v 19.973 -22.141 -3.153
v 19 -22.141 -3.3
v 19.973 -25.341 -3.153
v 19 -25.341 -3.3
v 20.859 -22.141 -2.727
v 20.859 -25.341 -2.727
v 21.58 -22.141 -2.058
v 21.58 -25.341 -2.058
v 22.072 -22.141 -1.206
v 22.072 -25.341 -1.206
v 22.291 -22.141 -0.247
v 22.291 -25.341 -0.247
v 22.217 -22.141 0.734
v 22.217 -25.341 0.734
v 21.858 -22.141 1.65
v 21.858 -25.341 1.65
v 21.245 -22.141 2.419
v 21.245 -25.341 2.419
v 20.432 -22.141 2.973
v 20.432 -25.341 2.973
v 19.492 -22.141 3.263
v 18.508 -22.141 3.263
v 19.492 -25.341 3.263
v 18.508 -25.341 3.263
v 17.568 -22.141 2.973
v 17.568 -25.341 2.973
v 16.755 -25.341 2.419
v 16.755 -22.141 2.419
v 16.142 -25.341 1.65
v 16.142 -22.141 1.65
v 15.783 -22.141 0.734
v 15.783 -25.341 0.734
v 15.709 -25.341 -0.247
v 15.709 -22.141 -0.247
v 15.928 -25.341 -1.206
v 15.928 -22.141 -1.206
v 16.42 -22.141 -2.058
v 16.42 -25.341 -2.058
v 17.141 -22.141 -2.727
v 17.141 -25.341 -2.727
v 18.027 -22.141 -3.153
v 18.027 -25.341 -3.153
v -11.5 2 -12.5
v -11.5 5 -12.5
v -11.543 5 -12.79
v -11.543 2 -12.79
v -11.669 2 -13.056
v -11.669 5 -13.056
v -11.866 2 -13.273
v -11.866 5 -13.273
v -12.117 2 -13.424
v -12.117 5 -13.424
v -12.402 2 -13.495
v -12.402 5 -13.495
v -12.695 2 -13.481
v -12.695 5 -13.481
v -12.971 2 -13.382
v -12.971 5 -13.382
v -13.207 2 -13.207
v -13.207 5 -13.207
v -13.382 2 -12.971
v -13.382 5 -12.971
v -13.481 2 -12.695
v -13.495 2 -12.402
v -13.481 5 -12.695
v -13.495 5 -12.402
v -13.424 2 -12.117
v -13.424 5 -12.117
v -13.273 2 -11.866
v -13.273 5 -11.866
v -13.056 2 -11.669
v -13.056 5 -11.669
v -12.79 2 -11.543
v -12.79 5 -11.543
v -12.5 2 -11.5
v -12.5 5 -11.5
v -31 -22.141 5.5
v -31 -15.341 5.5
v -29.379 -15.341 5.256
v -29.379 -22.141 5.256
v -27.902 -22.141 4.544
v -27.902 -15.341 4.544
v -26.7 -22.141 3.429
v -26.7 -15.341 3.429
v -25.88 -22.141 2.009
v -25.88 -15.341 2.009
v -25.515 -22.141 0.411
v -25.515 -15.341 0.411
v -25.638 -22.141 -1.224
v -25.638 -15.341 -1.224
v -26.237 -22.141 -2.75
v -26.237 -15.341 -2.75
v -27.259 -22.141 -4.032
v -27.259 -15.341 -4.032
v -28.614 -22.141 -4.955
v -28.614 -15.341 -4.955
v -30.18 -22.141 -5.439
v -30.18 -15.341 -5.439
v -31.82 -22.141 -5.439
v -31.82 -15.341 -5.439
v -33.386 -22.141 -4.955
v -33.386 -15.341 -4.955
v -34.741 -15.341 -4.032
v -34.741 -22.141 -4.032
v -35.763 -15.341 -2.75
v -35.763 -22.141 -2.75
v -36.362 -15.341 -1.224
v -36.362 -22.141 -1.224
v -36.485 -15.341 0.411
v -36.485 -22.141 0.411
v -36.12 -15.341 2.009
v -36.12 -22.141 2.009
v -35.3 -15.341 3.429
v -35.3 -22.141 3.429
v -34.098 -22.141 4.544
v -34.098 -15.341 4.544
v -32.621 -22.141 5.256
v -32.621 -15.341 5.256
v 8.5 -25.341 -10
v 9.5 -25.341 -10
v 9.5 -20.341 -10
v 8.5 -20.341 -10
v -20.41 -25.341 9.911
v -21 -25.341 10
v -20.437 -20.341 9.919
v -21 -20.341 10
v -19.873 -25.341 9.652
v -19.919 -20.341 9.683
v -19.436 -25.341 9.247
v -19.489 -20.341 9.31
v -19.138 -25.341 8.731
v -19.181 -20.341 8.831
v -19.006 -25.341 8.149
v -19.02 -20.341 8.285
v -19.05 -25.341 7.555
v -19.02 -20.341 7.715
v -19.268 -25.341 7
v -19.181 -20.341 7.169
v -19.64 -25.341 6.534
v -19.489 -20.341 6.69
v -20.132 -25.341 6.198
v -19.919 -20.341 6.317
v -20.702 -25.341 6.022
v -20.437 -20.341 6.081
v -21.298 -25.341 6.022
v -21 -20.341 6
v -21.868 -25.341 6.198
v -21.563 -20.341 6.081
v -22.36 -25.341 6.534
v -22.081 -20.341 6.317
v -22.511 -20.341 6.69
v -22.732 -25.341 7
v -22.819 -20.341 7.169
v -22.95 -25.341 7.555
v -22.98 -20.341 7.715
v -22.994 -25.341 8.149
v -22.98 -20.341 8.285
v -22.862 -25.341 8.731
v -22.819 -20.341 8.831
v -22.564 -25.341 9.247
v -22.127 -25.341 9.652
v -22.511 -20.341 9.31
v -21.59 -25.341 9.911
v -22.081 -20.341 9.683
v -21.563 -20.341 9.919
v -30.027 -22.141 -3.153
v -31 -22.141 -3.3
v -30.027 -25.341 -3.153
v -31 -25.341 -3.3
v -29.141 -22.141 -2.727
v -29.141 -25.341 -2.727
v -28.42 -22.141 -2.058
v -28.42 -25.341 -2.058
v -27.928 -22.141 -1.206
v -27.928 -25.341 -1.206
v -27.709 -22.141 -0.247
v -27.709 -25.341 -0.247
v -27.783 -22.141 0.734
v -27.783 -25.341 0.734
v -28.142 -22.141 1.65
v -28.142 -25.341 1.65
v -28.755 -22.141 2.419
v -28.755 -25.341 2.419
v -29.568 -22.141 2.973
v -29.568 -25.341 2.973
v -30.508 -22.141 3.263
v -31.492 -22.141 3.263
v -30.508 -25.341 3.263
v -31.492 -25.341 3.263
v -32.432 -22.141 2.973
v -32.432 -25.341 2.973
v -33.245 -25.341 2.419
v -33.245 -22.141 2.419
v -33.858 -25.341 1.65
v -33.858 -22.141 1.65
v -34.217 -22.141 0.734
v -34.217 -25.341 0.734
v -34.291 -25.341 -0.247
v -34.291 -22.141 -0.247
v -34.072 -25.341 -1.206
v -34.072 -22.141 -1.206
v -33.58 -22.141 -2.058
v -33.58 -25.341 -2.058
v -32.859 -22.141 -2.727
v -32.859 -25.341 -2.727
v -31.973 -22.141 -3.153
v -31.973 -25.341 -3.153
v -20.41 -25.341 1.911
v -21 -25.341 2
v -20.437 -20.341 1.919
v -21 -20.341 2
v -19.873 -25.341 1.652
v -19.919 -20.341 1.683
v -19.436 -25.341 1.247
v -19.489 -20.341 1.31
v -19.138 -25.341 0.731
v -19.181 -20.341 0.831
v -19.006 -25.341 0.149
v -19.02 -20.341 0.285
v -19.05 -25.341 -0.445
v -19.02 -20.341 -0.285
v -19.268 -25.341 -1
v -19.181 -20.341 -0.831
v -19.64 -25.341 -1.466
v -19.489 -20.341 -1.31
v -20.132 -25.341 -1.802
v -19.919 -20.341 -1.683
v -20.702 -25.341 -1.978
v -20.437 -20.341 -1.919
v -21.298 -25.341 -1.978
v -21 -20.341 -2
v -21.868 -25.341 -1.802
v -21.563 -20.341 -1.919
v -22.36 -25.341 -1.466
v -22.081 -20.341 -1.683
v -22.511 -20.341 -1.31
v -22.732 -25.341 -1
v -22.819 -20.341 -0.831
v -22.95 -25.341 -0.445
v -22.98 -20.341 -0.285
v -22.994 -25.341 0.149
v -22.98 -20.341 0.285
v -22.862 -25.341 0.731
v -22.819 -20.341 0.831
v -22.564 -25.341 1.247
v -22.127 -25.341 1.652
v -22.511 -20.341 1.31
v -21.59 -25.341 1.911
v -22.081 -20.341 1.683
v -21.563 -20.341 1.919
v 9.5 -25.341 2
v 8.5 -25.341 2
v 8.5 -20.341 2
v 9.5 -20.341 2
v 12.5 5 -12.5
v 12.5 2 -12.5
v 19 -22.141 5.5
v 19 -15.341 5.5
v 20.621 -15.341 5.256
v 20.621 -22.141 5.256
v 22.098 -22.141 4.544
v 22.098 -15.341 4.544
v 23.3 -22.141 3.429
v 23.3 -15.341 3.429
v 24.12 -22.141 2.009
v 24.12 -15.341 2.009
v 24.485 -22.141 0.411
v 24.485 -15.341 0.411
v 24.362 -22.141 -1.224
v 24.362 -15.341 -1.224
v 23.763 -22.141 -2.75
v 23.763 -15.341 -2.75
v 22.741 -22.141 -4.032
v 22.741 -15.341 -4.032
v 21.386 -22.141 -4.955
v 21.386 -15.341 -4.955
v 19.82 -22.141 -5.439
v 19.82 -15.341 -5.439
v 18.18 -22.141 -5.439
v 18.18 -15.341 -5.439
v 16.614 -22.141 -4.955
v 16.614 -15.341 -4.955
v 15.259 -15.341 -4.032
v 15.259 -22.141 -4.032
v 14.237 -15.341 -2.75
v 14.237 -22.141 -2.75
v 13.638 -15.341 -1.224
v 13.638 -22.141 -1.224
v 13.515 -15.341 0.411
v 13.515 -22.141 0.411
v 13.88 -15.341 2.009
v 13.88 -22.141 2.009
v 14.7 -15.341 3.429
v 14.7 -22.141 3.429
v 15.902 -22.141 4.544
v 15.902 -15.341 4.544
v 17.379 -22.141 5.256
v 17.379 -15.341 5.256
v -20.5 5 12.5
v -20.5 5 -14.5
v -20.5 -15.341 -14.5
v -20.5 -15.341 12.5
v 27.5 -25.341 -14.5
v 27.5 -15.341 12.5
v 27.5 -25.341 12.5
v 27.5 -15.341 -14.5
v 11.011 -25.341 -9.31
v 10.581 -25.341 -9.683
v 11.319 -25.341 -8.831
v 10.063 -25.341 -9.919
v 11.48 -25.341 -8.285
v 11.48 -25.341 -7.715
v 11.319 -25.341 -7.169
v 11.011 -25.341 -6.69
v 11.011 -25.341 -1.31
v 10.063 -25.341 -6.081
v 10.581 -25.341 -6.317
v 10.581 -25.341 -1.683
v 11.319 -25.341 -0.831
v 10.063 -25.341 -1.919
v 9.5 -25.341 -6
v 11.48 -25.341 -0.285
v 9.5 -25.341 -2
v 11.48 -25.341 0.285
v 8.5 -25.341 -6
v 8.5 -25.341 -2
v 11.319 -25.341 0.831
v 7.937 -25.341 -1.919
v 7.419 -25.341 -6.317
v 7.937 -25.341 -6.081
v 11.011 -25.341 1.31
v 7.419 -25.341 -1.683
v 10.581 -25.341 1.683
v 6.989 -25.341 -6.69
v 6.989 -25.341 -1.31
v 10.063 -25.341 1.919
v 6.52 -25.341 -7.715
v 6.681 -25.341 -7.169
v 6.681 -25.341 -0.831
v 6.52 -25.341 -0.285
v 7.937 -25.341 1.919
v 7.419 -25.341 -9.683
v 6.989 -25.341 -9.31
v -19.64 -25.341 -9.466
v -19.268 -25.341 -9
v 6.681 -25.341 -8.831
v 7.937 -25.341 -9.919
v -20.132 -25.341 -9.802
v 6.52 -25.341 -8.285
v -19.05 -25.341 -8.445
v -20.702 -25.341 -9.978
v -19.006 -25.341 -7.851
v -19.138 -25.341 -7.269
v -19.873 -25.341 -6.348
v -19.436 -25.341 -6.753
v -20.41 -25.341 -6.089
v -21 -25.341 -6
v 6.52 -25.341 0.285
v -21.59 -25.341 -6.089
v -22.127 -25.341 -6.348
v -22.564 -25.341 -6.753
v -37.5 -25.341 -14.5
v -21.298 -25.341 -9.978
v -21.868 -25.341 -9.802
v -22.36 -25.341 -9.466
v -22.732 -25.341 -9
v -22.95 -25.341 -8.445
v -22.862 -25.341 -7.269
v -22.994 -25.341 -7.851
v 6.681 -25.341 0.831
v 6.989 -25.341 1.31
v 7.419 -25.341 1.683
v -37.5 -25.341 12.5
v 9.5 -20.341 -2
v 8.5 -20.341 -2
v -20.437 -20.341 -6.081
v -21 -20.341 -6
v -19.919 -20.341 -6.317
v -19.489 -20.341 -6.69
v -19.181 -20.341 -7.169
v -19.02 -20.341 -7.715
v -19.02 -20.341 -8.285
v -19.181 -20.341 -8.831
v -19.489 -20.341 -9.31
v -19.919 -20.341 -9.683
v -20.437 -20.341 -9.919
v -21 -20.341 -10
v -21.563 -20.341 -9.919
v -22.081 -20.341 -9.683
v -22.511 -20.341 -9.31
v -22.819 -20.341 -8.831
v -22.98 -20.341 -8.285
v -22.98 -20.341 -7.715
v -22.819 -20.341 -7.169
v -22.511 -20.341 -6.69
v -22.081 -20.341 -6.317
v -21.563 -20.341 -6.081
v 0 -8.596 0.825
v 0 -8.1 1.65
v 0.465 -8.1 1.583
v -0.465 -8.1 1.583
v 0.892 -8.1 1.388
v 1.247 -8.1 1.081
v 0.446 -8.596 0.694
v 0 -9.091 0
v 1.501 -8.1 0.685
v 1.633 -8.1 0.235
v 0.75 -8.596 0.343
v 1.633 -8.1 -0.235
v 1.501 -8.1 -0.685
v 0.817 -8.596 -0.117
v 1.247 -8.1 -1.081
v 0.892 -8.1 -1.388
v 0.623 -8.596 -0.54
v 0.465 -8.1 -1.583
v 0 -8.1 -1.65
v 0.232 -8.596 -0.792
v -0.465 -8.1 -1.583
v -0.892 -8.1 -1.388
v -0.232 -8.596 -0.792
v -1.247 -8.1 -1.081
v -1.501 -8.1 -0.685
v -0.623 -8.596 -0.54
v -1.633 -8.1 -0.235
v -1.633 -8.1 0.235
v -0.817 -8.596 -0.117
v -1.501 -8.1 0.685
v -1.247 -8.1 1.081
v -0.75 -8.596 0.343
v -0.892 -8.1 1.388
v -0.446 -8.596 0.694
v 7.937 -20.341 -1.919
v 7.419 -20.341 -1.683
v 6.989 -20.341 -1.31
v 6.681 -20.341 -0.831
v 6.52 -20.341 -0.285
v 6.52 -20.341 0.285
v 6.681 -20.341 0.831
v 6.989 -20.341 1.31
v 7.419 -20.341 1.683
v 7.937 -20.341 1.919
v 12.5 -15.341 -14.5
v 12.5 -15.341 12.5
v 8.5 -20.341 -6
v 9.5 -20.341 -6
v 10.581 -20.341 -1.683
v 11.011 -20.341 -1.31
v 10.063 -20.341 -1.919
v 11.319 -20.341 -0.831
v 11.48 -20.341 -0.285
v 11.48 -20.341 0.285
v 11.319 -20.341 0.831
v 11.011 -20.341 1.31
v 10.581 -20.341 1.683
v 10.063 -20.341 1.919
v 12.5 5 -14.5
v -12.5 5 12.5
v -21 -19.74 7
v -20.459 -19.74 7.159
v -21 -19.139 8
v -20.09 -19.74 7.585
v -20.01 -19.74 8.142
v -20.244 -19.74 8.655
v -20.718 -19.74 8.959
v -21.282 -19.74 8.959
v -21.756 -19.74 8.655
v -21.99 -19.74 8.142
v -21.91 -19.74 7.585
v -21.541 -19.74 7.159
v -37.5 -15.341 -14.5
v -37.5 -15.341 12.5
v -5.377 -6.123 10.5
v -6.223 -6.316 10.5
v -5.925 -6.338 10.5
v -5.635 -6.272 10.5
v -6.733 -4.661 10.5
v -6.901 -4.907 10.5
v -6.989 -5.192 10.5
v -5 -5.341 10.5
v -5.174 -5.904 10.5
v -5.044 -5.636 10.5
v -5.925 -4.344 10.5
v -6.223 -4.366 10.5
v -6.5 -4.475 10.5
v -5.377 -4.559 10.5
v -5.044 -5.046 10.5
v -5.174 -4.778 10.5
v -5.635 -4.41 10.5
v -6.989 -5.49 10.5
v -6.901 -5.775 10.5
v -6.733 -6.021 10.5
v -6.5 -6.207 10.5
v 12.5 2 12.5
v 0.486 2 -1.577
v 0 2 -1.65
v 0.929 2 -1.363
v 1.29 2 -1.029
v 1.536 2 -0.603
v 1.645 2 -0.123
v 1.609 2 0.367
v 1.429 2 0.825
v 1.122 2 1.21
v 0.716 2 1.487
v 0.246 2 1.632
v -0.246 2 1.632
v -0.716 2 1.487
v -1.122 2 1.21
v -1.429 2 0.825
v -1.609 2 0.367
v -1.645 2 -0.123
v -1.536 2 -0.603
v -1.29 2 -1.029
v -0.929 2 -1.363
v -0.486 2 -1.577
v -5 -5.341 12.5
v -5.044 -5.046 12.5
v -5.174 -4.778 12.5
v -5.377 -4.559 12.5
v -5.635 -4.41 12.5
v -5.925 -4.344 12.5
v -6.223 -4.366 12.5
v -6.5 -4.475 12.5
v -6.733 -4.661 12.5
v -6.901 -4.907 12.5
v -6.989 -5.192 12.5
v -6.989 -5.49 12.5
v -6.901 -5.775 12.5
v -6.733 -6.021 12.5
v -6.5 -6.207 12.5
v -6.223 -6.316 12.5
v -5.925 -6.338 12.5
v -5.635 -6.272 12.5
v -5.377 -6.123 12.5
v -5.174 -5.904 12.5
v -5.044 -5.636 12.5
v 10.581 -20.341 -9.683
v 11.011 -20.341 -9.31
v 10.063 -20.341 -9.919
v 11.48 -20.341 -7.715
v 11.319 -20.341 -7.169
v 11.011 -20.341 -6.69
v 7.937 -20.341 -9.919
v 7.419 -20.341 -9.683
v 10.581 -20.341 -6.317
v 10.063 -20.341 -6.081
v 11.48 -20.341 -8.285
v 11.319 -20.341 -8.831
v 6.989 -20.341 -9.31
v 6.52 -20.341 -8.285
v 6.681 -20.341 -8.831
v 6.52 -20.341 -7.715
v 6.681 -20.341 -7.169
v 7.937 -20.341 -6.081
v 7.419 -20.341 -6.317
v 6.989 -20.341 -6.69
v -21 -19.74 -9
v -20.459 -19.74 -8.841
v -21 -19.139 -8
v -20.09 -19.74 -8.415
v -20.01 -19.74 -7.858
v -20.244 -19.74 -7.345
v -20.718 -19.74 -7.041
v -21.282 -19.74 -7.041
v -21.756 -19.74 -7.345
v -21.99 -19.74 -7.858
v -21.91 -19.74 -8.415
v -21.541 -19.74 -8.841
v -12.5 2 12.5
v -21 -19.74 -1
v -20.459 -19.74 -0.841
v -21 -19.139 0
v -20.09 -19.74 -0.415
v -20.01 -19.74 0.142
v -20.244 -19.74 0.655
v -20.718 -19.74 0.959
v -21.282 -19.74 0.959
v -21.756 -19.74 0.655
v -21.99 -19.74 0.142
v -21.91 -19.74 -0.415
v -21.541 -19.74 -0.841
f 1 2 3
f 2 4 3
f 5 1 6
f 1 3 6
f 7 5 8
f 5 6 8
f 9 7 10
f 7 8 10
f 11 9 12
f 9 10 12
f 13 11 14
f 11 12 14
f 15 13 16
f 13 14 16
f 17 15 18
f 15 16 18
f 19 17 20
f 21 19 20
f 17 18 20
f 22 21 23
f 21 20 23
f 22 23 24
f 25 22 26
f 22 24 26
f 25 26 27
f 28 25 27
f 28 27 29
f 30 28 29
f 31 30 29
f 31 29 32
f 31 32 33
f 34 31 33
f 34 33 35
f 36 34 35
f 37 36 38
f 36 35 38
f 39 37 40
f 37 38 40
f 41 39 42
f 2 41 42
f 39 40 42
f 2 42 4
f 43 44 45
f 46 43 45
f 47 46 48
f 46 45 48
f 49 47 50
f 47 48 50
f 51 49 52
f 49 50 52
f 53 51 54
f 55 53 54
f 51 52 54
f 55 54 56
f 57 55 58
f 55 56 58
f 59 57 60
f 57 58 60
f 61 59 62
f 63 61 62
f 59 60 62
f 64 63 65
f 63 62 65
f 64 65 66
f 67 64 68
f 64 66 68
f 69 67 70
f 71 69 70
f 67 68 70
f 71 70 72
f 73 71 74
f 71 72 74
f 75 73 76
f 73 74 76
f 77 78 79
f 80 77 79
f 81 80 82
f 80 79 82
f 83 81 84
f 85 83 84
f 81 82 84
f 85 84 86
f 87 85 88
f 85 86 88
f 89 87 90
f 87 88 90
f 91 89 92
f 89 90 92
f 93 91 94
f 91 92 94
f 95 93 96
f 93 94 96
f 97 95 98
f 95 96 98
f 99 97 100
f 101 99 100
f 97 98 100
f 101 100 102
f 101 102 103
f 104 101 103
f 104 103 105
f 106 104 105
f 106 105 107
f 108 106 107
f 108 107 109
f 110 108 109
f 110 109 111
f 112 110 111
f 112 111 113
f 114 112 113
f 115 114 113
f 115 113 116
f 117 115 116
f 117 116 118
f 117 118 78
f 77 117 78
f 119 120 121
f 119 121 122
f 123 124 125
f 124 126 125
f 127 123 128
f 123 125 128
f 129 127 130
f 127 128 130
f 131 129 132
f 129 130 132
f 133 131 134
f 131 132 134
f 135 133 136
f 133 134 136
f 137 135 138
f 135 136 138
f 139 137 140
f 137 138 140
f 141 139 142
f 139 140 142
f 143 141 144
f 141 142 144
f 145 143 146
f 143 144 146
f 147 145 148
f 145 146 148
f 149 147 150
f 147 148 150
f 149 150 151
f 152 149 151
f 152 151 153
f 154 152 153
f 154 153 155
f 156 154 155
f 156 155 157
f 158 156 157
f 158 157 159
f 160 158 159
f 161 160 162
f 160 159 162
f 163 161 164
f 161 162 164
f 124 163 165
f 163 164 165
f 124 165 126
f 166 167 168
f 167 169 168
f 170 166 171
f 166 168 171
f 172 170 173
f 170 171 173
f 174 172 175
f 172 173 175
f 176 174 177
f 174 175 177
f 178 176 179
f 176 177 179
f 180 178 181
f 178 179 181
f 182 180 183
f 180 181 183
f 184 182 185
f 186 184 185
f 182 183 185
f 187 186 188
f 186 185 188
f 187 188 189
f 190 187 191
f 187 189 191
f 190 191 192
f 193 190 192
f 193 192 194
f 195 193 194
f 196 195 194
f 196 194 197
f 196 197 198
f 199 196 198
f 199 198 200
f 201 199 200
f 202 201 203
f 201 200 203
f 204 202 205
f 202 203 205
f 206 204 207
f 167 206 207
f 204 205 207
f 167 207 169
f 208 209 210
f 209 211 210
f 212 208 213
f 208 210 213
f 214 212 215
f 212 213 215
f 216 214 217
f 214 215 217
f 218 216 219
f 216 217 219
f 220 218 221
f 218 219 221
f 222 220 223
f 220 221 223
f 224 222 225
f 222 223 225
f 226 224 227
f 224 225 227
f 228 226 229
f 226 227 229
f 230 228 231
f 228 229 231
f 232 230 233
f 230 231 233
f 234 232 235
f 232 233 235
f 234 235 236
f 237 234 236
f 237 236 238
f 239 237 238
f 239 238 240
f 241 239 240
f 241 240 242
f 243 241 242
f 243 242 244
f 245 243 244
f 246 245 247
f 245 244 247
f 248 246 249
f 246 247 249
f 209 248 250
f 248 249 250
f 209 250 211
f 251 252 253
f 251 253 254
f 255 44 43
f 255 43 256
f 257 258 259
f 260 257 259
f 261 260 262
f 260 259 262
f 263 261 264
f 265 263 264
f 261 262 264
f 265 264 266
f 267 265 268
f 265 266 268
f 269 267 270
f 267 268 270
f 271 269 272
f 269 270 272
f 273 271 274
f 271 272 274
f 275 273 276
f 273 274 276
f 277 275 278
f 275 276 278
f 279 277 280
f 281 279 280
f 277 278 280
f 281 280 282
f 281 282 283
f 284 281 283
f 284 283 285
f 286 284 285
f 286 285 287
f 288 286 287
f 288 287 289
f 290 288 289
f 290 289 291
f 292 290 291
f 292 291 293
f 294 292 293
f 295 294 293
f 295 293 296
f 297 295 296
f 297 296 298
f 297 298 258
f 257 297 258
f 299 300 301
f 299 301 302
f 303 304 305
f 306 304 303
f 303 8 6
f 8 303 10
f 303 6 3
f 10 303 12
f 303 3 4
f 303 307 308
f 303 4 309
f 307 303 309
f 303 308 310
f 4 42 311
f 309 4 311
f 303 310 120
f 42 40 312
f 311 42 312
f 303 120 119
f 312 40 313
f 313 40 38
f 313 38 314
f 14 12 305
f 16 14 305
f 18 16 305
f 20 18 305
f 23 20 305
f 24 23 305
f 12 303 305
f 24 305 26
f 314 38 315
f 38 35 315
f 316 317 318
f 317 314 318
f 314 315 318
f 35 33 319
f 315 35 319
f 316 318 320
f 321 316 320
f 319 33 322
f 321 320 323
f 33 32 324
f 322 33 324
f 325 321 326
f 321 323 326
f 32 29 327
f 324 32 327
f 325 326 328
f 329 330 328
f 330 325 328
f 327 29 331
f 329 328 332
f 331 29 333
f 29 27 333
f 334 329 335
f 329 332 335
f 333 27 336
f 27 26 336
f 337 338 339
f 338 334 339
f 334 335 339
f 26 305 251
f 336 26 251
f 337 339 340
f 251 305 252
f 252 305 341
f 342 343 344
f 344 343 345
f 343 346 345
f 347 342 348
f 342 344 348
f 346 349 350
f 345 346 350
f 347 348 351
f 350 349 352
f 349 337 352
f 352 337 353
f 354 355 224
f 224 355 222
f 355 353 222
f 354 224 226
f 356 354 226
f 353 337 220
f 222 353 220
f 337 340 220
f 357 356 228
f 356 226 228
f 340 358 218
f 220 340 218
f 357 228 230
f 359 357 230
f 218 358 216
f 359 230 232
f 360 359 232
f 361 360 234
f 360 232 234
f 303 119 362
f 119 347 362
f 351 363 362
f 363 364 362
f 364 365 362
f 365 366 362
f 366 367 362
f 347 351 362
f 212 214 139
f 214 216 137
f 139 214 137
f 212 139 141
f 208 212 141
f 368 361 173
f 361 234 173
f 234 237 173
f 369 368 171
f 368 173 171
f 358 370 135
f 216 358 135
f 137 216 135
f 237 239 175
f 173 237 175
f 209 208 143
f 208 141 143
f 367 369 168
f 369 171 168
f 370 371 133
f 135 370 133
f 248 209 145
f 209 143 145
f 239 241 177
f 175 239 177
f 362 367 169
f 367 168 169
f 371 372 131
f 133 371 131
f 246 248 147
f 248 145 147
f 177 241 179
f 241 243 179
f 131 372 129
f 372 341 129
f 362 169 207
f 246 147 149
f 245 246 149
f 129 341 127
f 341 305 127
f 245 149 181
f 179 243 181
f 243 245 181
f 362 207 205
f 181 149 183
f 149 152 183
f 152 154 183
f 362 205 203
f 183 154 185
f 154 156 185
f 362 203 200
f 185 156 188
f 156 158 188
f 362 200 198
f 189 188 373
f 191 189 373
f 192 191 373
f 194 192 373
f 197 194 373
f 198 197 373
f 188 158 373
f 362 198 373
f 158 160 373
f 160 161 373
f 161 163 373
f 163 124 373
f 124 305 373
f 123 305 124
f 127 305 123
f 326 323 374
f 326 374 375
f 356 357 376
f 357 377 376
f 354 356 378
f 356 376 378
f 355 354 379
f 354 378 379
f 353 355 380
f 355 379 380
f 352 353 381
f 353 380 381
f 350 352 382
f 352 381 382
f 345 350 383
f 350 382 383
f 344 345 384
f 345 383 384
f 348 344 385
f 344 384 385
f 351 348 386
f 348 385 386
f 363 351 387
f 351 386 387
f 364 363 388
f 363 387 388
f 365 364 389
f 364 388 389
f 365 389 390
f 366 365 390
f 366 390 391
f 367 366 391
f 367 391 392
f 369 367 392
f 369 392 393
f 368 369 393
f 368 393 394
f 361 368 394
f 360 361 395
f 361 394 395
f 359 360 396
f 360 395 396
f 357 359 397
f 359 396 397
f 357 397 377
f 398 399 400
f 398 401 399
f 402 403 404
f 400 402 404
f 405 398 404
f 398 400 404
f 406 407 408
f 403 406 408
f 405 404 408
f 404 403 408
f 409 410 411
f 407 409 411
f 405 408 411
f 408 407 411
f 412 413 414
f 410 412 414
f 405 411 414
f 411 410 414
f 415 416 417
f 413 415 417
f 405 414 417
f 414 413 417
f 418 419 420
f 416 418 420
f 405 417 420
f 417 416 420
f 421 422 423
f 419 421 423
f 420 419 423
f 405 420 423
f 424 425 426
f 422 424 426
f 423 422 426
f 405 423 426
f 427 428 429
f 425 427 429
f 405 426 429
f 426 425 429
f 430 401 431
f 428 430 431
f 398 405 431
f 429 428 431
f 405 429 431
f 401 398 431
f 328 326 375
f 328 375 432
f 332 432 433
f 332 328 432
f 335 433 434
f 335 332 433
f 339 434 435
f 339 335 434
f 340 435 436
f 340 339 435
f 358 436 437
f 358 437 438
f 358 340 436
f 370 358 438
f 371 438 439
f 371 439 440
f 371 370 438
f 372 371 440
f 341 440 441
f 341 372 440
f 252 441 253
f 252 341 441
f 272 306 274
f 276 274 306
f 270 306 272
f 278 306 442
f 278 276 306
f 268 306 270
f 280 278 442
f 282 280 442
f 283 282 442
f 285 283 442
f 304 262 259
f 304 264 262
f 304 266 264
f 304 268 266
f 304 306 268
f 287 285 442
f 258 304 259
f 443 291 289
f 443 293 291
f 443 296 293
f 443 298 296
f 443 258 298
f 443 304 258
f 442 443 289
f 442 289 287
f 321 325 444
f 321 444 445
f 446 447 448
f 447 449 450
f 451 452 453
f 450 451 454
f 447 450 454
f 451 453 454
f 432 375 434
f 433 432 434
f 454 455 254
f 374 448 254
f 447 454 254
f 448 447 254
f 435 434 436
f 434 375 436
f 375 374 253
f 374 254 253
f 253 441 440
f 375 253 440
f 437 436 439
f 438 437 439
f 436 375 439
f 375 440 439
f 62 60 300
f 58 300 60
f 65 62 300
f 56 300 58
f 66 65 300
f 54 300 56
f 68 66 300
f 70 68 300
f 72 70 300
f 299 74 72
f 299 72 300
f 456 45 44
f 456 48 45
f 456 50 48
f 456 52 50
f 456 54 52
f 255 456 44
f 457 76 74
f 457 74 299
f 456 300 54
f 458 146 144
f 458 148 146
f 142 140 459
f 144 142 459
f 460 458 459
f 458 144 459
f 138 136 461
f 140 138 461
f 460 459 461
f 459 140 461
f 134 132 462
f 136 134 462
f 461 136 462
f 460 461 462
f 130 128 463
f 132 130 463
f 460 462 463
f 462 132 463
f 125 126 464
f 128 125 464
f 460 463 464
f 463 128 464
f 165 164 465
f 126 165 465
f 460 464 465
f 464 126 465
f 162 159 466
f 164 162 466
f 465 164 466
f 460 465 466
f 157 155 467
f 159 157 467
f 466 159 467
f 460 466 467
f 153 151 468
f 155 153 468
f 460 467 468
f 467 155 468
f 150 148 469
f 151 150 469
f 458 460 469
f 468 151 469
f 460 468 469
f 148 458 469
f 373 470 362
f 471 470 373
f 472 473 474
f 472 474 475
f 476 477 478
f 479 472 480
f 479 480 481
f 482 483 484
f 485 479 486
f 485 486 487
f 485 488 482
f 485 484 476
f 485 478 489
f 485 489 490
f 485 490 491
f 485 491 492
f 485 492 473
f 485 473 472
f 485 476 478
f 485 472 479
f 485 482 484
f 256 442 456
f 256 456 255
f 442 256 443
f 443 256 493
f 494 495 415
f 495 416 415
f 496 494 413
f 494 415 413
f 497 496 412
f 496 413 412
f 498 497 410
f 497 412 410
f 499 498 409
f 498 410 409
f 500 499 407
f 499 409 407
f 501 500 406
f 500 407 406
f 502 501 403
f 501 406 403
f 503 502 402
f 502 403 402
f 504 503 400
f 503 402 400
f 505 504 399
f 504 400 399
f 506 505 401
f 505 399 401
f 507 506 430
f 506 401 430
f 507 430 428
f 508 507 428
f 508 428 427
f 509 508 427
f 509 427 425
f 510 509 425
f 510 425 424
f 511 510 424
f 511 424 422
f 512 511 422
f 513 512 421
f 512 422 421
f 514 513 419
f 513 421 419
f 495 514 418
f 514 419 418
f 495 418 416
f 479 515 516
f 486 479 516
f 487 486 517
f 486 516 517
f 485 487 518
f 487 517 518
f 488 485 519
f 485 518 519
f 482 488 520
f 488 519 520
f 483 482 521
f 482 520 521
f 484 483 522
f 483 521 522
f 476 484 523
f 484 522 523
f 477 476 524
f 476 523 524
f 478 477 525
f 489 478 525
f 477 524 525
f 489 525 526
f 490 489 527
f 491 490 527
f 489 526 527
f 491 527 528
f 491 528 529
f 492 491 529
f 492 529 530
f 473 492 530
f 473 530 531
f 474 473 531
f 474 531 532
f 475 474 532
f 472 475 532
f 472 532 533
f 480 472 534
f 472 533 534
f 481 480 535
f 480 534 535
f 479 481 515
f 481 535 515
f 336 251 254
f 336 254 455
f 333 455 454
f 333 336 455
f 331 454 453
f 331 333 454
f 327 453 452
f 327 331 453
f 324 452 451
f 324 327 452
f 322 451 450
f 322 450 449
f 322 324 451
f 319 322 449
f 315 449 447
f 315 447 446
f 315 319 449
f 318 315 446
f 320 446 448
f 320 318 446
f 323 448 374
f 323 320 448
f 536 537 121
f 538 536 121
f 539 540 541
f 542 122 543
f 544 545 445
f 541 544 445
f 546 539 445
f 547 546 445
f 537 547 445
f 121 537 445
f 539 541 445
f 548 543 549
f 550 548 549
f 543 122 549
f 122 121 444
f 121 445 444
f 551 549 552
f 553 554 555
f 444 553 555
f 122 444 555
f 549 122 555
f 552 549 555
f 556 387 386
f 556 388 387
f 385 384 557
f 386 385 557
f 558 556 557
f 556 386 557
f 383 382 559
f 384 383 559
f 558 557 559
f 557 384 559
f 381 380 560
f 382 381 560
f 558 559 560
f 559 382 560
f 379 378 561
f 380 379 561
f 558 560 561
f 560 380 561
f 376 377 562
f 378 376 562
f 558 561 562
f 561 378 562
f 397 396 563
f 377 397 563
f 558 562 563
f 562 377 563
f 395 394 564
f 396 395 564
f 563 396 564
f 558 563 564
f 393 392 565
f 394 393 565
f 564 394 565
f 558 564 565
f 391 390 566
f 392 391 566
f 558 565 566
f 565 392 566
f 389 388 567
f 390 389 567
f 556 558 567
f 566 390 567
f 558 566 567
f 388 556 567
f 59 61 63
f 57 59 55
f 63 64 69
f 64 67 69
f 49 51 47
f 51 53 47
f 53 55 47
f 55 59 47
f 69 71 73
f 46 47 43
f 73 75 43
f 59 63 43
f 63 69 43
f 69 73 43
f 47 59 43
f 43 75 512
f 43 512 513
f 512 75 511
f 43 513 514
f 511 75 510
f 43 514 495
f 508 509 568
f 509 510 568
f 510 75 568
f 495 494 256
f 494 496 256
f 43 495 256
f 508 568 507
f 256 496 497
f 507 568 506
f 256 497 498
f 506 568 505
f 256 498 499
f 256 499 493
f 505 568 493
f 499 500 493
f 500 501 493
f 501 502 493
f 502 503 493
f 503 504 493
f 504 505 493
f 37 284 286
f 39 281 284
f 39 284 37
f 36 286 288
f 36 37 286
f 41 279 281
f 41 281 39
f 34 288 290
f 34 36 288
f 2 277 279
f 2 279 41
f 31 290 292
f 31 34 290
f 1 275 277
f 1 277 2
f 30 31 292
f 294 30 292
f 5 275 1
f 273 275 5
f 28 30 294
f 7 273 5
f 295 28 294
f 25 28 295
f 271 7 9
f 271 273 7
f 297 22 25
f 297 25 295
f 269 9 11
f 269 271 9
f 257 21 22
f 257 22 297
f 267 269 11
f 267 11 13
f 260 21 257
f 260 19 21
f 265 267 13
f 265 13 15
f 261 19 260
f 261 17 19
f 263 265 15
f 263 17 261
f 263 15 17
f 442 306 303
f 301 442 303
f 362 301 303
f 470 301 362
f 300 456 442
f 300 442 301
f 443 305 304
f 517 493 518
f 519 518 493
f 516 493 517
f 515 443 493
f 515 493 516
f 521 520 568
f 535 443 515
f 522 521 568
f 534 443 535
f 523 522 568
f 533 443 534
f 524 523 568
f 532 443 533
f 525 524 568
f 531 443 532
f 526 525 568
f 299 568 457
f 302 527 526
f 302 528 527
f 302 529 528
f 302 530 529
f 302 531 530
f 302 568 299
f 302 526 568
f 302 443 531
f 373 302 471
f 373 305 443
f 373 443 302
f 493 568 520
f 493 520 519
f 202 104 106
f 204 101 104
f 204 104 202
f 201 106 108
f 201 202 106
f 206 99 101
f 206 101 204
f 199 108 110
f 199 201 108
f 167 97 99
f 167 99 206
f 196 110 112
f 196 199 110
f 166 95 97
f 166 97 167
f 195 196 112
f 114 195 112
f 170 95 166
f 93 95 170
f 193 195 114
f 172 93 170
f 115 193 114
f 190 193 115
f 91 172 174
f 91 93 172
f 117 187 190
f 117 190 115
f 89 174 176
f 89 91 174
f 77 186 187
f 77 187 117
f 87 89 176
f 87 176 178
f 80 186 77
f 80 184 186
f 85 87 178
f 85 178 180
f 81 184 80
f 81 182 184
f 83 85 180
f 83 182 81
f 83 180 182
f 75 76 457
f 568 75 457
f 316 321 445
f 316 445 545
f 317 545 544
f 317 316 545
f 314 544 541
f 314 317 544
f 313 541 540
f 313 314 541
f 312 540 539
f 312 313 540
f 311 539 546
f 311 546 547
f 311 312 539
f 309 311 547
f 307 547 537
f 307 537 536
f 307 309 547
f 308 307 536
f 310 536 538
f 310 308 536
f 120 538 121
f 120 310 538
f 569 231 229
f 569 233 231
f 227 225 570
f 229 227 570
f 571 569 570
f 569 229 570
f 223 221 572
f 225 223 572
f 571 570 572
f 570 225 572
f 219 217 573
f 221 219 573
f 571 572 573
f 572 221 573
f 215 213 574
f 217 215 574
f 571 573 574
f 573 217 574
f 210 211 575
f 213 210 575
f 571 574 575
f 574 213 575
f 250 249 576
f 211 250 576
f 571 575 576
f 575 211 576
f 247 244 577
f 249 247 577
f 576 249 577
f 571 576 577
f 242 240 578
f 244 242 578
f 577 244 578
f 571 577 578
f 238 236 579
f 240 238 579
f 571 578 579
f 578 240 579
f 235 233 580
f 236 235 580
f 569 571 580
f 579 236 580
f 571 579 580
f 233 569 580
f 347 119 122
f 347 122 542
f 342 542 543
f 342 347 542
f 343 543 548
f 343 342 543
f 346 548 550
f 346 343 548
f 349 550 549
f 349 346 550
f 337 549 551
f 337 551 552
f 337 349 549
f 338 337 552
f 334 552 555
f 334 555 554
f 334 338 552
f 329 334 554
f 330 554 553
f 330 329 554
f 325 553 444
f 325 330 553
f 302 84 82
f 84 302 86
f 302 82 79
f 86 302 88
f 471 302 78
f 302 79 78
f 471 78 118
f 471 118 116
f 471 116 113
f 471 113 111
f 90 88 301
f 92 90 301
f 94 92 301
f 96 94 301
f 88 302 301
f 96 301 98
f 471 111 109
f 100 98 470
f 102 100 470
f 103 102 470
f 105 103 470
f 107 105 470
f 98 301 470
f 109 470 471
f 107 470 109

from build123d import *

# Parameters (mm, degrees)
SKETCH_1_W                = 29
SKETCH_1_H                = 29
EXTRUDE_1_DEPTH           = 5
SKETCH_2_W                = 25
SKETCH_2_H                = 25
CUT_EXTRUDE_1_DEPTH       = 3
SKETCH_3_W                = 35
SKETCH_3_H                = 29
EXTRUDE_747_DEPTH         = 25.341167732
HOLE_WIZARD_M4_1_D        = 3.3
HOLE_WIZARD_M4_1_DEPTH    = 10.1
HOLE_WIZARD_M4_1_TIP      = 0.991420021
SKETCH_9_R                = 1
CUT_EXTRUDE_2_DEPTH       = 3
SKETCH_11_W               = 29
SKETCH_11_H               = 5
EXTRUDE_4_DEPTH           = 6
CUT_EXTRUDE_8_DEPTH       = 40.383835
SKETCH_19_W               = 80
SKETCH_19_H               = 25
EXTRUDE_5_DEPTH           = 10
HOLE_WIZARD_1_D           = 6.6
HOLE_WIZARD_1_DEPTH       = 10.1
HOLE_WIZARD_1_CBORE_D     = 11
HOLE_WIZARD_1_CBORE_DEPTH = 6.8
HOLE_WIZARD_1_TIP         = 1.982840043
SKETCH_23_W               = 80
SKETCH_23_H               = 10
EXTRUDE_6_DEPTH           = 2
SKETCH_24_W               = 27
SKETCH_24_H               = 10
CUT_EXTRUDE_9_DEPTH       = 2
MM_1_D                    = 4
MM_1_DEPTH                = 5
MM_1_TIP                  = 1.201721238
CUT_EXTRUDE_10_DEPTH      = 5
SKETCH_28_R               = 1
CUT_EXTRUDE_11_DEPTH      = 2
HOLE_WIZARD_M6_1_D        = 5
HOLE_WIZARD_M6_1_DEPTH    = 10
HOLE_WIZARD_M6_1_TIP      = 1.502151548
CUT_EXTRUDE_12_DEPTH      = 62.837260656
CUT_EXTRUDE_12_DEPTH_BACK = 62.837260656
SKETCH_32_W               = 27
SKETCH_32_H               = 10
CUT_EXTRUDE_13_DEPTH      = 6.5
SKETCH_33_W               = 27
SKETCH_33_H               = 10
CUT_EXTRUDE_14_DEPTH      = 6.5
CUT_EXTRUDE_15_DEPTH      = 5
MM_2_D                    = 4
MM_2_DEPTH                = 5
MM_2_TIP                  = 1.201721238
MM_3_D                    = 4
MM_3_DEPTH                = 5
MM_3_TIP                  = 1.201721238
SKETCH_38_W               = 23.961905905
SKETCH_38_H               = 13.839319444
EXTRUDE_7_DEPTH           = 27


with BuildPart() as part:
    # 草图1 → 凸台-拉伸1 (new body)
    with BuildSketch(Plane(origin=(0, 0, 0), x_dir=(1, 0, 0), z_dir=(0, 1, 0))):
        Rectangle(SKETCH_1_W, SKETCH_1_H)
    extrude(amount=EXTRUDE_1_DEPTH)

    # 草图2 → 切除-拉伸1 (cut)
    with BuildSketch(Plane.XZ.offset(-5)):
        Rectangle(SKETCH_2_W, SKETCH_2_H)
    extrude(amount=CUT_EXTRUDE_1_DEPTH, mode=Mode.SUBTRACT)

    # 草图3 → Extrude 747 (add)
    with BuildSketch(Plane(origin=(0, 0, 0), x_dir=(-1, 0, 0), z_dir=(0, -1, 0))):
        with Locations((3, 0)):
            Rectangle(SKETCH_3_W, SKETCH_3_H)
    extrude(amount=EXTRUDE_747_DEPTH)

    # M4 螺纹孔1
    with Locations(Plane.ZX.offset(2)):
        with Locations((0, 0)):
            Hole(HOLE_WIZARD_M4_1_D / 2, depth=HOLE_WIZARD_M4_1_DEPTH)
            with Locations((0, 0, -(HOLE_WIZARD_M4_1_DEPTH + HOLE_WIZARD_M4_1_TIP / 2))):  # 118° drill point
                Cone(0, HOLE_WIZARD_M4_1_D / 2, HOLE_WIZARD_M4_1_TIP, mode=Mode.SUBTRACT)

    # 草图9 → 切除-拉伸2 (cut)
    with BuildSketch(Plane(origin=(0, 5, 0), x_dir=(1, 0, 0), z_dir=(0, 1, 0))):
        with Locations((-12.5, 12.5)):
            Circle(SKETCH_9_R)
    extrude(amount=-CUT_EXTRUDE_2_DEPTH, mode=Mode.SUBTRACT)

    # 草图11 → 凸台-拉伸4 (add)
    with BuildSketch(Plane.ZY.offset(14.5)):
        with Locations((0, 2.5)):
            Rectangle(SKETCH_11_W, SKETCH_11_H)
    extrude(amount=EXTRUDE_4_DEPTH)

    # 草图17 → 切除-拉伸8 (cut, through all)
    with BuildSketch(Plane(origin=(0, 5, 0), x_dir=(1, 0, 0), z_dir=(0, 1, 0))):
        Polygon((-20.5, -14.5), (14.5, -14.5), (14.5, 14.5), (12.5, 14.5), (12.5, -12.5), (-20.5, -12.5), align=None)
    extrude(amount=-CUT_EXTRUDE_8_DEPTH, mode=Mode.SUBTRACT)

    # 草图19 → 凸台-拉伸5 (add)
    with BuildSketch(Plane(origin=(0, -25.341167732, 0), x_dir=(-1, 0, 0), z_dir=(0, -1, 0))):
        with Locations((6, 0)):
            Rectangle(SKETCH_19_W, SKETCH_19_H)
    extrude(amount=-EXTRUDE_5_DEPTH)

    # 打孔尺寸(%根据)内六角圆柱头螺钉的类型1
    with Locations(Plane(origin=(-31, -15.341167732, 0), x_dir=(0, 0, 1), z_dir=(0, 1, 0))):
        with Locations((0, 0), (0, 50)):
            CounterBoreHole(HOLE_WIZARD_1_D / 2, HOLE_WIZARD_1_CBORE_D / 2, HOLE_WIZARD_1_CBORE_DEPTH, depth=HOLE_WIZARD_1_DEPTH)
            with Locations((0, 0, -(HOLE_WIZARD_1_DEPTH + HOLE_WIZARD_1_TIP / 2))):  # 118° drill point
                Cone(0, HOLE_WIZARD_1_D / 2, HOLE_WIZARD_1_TIP, mode=Mode.SUBTRACT)

    # 草图23 → 凸台-拉伸6 (add)
    with BuildSketch(Plane(origin=(0, 0, -12.5), x_dir=(-1, 0, 0), z_dir=(0, 0, -1))):
        with Locations((6, -20.341167732)):
            Rectangle(SKETCH_23_W, SKETCH_23_H)
    extrude(amount=EXTRUDE_6_DEPTH)

    # 草图24 → 切除-拉伸9 (cut)
    with BuildSketch(Plane.ZY.offset(46)):
        with Locations((-1, -20.341167732)):
            Rectangle(SKETCH_24_W, SKETCH_24_H)
    extrude(amount=-CUT_EXTRUDE_9_DEPTH, mode=Mode.SUBTRACT)

    # 大小mm 暗销孔1
    with Locations(Plane(origin=(-21, -25.341167732, 0), x_dir=(0, 0, -1), z_dir=(0, -1, 0))):
        with Locations((0, 0)):
            Hole(MM_1_D / 2, depth=MM_1_DEPTH)
            with Locations((0, 0, -(MM_1_DEPTH + MM_1_TIP / 2))):  # 118° drill point
                Cone(0, MM_1_D / 2, MM_1_TIP, mode=Mode.SUBTRACT)

    # 草图27 → 切除-拉伸10 (cut)
    with BuildSketch(Plane.XZ.offset(25.341167732)):
        with BuildLine():
            Line((8.5, 2), (9.5, 2))
            ThreePointArc((9.5, 2), (11.5, 0), (9.5, -2))
            Line((9.5, -2), (8.5, -2))
            ThreePointArc((8.5, -2), (6.5, 0), (8.5, 2))
        make_face()
    extrude(amount=-CUT_EXTRUDE_10_DEPTH, mode=Mode.SUBTRACT)

    # 草图28 → 切除-拉伸11 (cut)
    with BuildSketch(Plane.XY.offset(12.5)):
        with Locations((-6, -5.341167732)):
            Circle(SKETCH_28_R)
    extrude(amount=-CUT_EXTRUDE_11_DEPTH, mode=Mode.SUBTRACT)

    # M6 螺纹孔1
    with Locations(Plane(origin=(-6, -25.341167732, 0), x_dir=(0, 0, -1), z_dir=(0, -1, 0))):
        with Locations((0, 0)):
            Hole(HOLE_WIZARD_M6_1_D / 2, depth=HOLE_WIZARD_M6_1_DEPTH)
            with Locations((0, 0, -(HOLE_WIZARD_M6_1_DEPTH + HOLE_WIZARD_M6_1_TIP / 2))):  # 118° drill point
                Cone(0, HOLE_WIZARD_M6_1_D / 2, HOLE_WIZARD_M6_1_TIP, mode=Mode.SUBTRACT)

    # 草图31 → 切除-拉伸12 (cut, two sides: drawn at the far end of the back side and taken through both)
    with BuildSketch(Plane(origin=(-6.0032, 14.658832268, 10.4718), x_dir=(1, 0, 0), z_dir=(0, 0, 1)).offset(-CUT_EXTRUDE_12_DEPTH_BACK)):
        with BuildLine():
            Line((10.117055245, -31.7), (8.854085532, -31.7))
            Line((8.854085532, -31.7), (6.07517942, -36.564132504))
            Line((6.07517942, -36.564132504), (6.531795149, -36.824999624))
            Line((6.531795149, -36.824999624), (10.275, -36.824999624))
            ThreePointArc((10.275, -36.824999624), (11.025, -37.574999624), (10.275, -38.324999624))
            Line((10.275, -38.324999624), (9.525, -38.324999624))
            Line((9.525, -38.324999624), (9.525, -40))
            Line((9.525, -40), (-9.776101272, -40))
            Line((-9.776101272, -40), (-9.776101272, -38.074384714))
            Line((-9.776101272, -38.074384714), (-10.526101272, -38.074384714))
            ThreePointArc((-10.526101272, -38.074384714), (-11.276101272, -37.324384714), (-10.526101272, -36.574384714))
            Line((-10.526101272, -36.574384714), (-6.501264425, -36.574384714))
            Line((-6.501264425, -36.574384714), (-6.501264425, -36.324384714))
            Line((-6.501264425, -36.324384714), (-9.143201284, -31.7))
            Line((-9.143201284, -31.7), (-10.369175052, -31.7))
            ThreePointArc((-10.369175052, -31.7), (-11.119175052, -30.95), (-10.369175052, -30.2))
            Line((-10.369175052, -30.2), (10.117055245, -30.2))
            ThreePointArc((10.117055245, -30.2), (10.867055245, -30.95), (10.117055245, -31.7))
        make_face()
    extrude(amount=CUT_EXTRUDE_12_DEPTH + CUT_EXTRUDE_12_DEPTH_BACK, mode=Mode.SUBTRACT)

    # 草图32 → 切除-拉伸13 (cut)
    with BuildSketch(Plane.ZY.offset(44)):
        with Locations((-1, -20.341167732)):
            Rectangle(SKETCH_32_W, SKETCH_32_H)
    extrude(amount=-CUT_EXTRUDE_13_DEPTH, mode=Mode.SUBTRACT)

    # 草图33 → 切除-拉伸14 (cut)
    with BuildSketch(Plane(origin=(34, 0, 0), x_dir=(0, 0, -1), z_dir=(1, 0, 0))):
        with Locations((1, -20.341167732)):
            Rectangle(SKETCH_33_W, SKETCH_33_H)
    extrude(amount=-CUT_EXTRUDE_14_DEPTH, mode=Mode.SUBTRACT)

    # 草图35 → 切除-拉伸15 (cut)
    with BuildSketch(Plane.XZ.offset(25.341167732)):
        with BuildLine():
            Line((8.5, -6), (9.5, -6))
            ThreePointArc((9.5, -6), (11.5, -8), (9.5, -10))
            Line((9.5, -10), (8.5, -10))
            ThreePointArc((8.5, -10), (6.5, -8), (8.5, -6))
        make_face()
    extrude(amount=-CUT_EXTRUDE_15_DEPTH, mode=Mode.SUBTRACT)

    # 大小mm 暗销孔2
    with Locations(Plane(origin=(-21, -25.341167732, -8), x_dir=(0, 0, -1), z_dir=(0, -1, 0))):
        with Locations((0, 0)):
            Hole(MM_2_D / 2, depth=MM_2_DEPTH)
            with Locations((0, 0, -(MM_2_DEPTH + MM_2_TIP / 2))):  # 118° drill point
                Cone(0, MM_2_D / 2, MM_2_TIP, mode=Mode.SUBTRACT)

    # 大小mm 暗销孔3
    with Locations(Plane(origin=(-21, -25.341167732, 8), x_dir=(0, 0, -1), z_dir=(0, -1, 0))):
        with Locations((0, 0)):
            Hole(MM_3_D / 2, depth=MM_3_DEPTH)
            with Locations((0, 0, -(MM_3_DEPTH + MM_3_TIP / 2))):  # 118° drill point
                Cone(0, MM_3_D / 2, MM_3_TIP, mode=Mode.SUBTRACT)

    # 草图38 → 凸台-拉伸7 (add)
    with BuildSketch(Plane.XY.offset(12.5)):
        with Locations((-6.428193068, -18.42150801)):
            Rectangle(SKETCH_38_W, SKETCH_38_H)
    extrude(amount=-EXTRUDE_7_DEPTH)


solid = part.part
